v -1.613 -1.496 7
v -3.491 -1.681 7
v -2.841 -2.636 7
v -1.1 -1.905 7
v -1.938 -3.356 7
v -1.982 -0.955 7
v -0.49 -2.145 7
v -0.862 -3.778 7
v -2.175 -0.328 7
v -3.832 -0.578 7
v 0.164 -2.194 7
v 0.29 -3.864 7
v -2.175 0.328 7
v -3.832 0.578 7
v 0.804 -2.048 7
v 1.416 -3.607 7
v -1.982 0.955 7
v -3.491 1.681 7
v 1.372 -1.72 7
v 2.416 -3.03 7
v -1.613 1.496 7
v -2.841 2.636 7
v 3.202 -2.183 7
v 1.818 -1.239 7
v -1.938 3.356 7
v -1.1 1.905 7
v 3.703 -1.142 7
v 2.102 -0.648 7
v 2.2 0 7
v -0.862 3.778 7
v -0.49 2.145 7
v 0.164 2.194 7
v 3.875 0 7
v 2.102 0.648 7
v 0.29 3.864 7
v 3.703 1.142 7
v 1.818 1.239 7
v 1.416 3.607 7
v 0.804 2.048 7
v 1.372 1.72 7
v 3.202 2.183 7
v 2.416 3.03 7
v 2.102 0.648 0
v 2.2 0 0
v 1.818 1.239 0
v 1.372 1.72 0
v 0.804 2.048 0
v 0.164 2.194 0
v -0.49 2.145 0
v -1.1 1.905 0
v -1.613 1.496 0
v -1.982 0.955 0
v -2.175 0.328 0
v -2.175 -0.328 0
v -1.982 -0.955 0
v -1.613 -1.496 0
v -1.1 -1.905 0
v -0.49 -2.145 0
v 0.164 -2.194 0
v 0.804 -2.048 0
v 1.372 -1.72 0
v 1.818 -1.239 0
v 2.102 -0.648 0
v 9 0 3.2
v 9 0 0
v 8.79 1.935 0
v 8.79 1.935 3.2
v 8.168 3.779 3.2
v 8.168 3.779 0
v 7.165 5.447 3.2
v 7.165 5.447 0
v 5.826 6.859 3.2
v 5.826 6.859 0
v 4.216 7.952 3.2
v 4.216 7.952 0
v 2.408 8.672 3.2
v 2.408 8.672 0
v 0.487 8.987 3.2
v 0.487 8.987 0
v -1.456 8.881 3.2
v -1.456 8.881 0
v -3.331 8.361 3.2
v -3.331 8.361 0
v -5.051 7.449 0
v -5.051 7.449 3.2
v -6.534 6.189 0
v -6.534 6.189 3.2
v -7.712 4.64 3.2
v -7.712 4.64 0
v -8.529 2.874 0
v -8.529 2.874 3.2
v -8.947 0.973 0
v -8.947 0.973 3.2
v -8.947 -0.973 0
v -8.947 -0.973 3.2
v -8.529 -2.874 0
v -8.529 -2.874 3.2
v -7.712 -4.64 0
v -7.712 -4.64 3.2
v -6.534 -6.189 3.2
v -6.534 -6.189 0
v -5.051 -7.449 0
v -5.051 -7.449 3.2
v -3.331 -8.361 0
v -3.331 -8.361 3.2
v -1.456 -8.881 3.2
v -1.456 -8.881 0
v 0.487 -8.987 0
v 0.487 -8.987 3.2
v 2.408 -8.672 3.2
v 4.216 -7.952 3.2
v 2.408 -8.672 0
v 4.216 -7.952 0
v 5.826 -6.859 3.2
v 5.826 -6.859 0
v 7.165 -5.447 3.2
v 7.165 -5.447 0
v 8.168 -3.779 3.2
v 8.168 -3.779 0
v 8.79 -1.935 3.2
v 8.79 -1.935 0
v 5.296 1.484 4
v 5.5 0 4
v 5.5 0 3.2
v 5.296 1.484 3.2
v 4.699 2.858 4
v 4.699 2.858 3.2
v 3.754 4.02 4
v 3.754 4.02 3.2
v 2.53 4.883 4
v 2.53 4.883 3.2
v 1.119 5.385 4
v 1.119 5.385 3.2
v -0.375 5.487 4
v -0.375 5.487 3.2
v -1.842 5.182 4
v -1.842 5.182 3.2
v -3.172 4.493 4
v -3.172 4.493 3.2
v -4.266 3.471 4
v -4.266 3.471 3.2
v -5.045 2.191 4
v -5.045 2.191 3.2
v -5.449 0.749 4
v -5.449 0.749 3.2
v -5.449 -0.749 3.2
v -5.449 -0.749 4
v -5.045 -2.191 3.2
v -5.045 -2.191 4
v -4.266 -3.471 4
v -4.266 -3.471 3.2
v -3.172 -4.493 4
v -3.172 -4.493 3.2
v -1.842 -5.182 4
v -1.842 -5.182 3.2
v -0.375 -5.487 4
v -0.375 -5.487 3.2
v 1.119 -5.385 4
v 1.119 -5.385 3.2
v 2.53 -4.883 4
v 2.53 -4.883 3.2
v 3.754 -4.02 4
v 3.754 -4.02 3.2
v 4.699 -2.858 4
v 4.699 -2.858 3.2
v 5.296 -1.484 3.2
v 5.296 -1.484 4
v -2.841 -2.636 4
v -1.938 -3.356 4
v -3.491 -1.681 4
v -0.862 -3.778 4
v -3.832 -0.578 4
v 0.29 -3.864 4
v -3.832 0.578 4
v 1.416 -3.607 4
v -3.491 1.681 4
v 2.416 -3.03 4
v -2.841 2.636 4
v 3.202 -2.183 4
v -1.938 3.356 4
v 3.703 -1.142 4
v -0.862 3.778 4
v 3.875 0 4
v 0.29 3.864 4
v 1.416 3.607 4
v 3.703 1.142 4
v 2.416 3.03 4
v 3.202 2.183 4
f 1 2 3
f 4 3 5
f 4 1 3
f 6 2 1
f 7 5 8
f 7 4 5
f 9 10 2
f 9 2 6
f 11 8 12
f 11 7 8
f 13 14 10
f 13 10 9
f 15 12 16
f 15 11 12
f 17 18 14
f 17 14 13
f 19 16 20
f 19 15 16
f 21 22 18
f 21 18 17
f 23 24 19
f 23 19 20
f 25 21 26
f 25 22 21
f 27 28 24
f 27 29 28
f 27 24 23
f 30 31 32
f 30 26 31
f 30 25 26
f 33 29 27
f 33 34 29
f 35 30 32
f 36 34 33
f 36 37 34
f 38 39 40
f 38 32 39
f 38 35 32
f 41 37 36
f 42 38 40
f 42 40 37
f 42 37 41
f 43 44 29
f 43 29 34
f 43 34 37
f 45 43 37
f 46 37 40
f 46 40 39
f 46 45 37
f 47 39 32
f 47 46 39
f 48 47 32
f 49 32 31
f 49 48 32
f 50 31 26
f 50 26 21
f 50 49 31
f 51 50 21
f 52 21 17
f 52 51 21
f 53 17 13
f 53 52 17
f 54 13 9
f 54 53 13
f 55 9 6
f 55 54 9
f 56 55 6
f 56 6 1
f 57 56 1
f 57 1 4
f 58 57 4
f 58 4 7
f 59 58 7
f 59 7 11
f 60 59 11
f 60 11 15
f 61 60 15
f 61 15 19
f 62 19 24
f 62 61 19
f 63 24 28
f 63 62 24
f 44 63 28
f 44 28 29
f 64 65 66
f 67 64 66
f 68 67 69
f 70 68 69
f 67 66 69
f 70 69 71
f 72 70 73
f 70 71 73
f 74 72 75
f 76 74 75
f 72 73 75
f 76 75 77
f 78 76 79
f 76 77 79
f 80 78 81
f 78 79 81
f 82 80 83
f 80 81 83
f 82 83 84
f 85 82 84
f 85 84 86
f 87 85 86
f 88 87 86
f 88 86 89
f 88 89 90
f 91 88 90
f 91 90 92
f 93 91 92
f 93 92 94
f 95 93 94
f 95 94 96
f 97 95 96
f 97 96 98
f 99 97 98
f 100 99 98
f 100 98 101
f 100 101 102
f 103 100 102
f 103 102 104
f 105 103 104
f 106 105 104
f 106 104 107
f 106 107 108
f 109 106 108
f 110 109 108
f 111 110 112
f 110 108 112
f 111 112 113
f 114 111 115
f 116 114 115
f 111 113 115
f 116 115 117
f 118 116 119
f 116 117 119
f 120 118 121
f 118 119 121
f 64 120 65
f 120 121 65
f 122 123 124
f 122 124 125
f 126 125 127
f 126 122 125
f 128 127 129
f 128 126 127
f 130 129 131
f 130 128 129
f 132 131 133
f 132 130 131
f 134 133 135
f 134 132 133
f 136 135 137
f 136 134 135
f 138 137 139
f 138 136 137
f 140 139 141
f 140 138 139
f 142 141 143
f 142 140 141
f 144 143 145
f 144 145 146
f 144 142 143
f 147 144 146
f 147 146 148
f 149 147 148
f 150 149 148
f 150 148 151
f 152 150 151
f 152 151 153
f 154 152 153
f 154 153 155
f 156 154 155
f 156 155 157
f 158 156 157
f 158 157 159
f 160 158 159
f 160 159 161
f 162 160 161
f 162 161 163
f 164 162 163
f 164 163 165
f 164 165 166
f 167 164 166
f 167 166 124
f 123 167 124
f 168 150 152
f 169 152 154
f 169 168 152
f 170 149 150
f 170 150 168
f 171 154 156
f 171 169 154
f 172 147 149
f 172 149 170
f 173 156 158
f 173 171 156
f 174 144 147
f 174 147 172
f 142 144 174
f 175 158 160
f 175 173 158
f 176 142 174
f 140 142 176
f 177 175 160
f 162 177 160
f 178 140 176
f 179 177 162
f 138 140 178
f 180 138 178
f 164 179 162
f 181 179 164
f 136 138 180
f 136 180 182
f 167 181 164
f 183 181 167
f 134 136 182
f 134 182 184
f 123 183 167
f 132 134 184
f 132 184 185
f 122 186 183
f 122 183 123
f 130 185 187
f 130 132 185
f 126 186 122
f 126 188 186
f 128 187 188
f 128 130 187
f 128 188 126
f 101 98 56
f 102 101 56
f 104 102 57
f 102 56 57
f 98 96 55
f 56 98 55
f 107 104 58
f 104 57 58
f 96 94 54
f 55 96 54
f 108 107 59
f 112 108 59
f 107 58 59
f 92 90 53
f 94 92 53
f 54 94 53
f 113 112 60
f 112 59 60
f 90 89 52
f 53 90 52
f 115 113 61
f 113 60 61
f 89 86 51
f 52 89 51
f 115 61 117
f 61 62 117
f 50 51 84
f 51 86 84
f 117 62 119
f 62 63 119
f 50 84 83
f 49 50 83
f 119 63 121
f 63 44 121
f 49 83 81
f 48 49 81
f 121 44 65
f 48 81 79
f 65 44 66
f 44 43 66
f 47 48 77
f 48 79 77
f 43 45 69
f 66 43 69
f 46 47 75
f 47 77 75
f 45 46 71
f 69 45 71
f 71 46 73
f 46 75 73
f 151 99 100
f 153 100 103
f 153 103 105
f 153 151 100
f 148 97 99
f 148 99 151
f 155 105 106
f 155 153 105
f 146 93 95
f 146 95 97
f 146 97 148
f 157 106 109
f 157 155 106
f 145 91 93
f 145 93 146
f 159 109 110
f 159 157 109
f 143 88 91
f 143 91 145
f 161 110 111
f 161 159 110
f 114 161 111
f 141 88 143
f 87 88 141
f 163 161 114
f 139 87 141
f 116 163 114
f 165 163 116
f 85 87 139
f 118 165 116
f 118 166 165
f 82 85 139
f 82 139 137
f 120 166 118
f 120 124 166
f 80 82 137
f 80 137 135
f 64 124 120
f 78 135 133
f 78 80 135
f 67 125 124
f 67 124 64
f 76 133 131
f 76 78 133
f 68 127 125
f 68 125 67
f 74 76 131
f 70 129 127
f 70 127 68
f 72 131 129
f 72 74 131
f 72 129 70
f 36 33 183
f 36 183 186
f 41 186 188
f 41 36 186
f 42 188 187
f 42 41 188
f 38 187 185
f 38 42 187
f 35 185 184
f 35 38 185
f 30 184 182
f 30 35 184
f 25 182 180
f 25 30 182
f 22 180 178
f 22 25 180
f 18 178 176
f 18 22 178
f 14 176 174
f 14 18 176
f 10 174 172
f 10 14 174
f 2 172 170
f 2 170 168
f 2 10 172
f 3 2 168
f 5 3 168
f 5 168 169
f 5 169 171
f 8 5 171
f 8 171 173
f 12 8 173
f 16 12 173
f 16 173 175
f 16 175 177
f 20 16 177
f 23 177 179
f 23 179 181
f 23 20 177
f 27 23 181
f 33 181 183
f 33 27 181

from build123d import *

# Parameters (mm, degrees)
SKETCH1_R           = 9
SKETCH1_R_2         = 2.2
BOSS_EXTRUDE1_DEPTH = 7
SKETCH2_R           = 9
SKETCH2_R_2         = 5.5
CUT_EXTRUDE1_DEPTH  = 3.8
SKETCH3_R           = 5.5
SKETCH3_R_2         = 3.875
CUT_EXTRUDE2_DEPTH  = 3


with BuildPart() as part:
    # Sketch1 → Boss-Extrude1 (new body)
    with BuildSketch(Plane.XY):
        Circle(SKETCH1_R)
        Circle(SKETCH1_R_2, mode=Mode.SUBTRACT)
    extrude(amount=BOSS_EXTRUDE1_DEPTH)

    # Sketch2 → Cut-Extrude1 (cut)
    with BuildSketch(Plane.XY.offset(7)):
        Circle(SKETCH2_R)
        Circle(SKETCH2_R_2, mode=Mode.SUBTRACT)
    extrude(amount=-CUT_EXTRUDE1_DEPTH, mode=Mode.SUBTRACT)

    # Sketch3 → Cut-Extrude2 (cut)
    with BuildSketch(Plane.XY.offset(7)):
        Circle(SKETCH3_R)
        Circle(SKETCH3_R_2, mode=Mode.SUBTRACT)
    extrude(amount=-CUT_EXTRUDE2_DEPTH, mode=Mode.SUBTRACT)


solid = part.part
